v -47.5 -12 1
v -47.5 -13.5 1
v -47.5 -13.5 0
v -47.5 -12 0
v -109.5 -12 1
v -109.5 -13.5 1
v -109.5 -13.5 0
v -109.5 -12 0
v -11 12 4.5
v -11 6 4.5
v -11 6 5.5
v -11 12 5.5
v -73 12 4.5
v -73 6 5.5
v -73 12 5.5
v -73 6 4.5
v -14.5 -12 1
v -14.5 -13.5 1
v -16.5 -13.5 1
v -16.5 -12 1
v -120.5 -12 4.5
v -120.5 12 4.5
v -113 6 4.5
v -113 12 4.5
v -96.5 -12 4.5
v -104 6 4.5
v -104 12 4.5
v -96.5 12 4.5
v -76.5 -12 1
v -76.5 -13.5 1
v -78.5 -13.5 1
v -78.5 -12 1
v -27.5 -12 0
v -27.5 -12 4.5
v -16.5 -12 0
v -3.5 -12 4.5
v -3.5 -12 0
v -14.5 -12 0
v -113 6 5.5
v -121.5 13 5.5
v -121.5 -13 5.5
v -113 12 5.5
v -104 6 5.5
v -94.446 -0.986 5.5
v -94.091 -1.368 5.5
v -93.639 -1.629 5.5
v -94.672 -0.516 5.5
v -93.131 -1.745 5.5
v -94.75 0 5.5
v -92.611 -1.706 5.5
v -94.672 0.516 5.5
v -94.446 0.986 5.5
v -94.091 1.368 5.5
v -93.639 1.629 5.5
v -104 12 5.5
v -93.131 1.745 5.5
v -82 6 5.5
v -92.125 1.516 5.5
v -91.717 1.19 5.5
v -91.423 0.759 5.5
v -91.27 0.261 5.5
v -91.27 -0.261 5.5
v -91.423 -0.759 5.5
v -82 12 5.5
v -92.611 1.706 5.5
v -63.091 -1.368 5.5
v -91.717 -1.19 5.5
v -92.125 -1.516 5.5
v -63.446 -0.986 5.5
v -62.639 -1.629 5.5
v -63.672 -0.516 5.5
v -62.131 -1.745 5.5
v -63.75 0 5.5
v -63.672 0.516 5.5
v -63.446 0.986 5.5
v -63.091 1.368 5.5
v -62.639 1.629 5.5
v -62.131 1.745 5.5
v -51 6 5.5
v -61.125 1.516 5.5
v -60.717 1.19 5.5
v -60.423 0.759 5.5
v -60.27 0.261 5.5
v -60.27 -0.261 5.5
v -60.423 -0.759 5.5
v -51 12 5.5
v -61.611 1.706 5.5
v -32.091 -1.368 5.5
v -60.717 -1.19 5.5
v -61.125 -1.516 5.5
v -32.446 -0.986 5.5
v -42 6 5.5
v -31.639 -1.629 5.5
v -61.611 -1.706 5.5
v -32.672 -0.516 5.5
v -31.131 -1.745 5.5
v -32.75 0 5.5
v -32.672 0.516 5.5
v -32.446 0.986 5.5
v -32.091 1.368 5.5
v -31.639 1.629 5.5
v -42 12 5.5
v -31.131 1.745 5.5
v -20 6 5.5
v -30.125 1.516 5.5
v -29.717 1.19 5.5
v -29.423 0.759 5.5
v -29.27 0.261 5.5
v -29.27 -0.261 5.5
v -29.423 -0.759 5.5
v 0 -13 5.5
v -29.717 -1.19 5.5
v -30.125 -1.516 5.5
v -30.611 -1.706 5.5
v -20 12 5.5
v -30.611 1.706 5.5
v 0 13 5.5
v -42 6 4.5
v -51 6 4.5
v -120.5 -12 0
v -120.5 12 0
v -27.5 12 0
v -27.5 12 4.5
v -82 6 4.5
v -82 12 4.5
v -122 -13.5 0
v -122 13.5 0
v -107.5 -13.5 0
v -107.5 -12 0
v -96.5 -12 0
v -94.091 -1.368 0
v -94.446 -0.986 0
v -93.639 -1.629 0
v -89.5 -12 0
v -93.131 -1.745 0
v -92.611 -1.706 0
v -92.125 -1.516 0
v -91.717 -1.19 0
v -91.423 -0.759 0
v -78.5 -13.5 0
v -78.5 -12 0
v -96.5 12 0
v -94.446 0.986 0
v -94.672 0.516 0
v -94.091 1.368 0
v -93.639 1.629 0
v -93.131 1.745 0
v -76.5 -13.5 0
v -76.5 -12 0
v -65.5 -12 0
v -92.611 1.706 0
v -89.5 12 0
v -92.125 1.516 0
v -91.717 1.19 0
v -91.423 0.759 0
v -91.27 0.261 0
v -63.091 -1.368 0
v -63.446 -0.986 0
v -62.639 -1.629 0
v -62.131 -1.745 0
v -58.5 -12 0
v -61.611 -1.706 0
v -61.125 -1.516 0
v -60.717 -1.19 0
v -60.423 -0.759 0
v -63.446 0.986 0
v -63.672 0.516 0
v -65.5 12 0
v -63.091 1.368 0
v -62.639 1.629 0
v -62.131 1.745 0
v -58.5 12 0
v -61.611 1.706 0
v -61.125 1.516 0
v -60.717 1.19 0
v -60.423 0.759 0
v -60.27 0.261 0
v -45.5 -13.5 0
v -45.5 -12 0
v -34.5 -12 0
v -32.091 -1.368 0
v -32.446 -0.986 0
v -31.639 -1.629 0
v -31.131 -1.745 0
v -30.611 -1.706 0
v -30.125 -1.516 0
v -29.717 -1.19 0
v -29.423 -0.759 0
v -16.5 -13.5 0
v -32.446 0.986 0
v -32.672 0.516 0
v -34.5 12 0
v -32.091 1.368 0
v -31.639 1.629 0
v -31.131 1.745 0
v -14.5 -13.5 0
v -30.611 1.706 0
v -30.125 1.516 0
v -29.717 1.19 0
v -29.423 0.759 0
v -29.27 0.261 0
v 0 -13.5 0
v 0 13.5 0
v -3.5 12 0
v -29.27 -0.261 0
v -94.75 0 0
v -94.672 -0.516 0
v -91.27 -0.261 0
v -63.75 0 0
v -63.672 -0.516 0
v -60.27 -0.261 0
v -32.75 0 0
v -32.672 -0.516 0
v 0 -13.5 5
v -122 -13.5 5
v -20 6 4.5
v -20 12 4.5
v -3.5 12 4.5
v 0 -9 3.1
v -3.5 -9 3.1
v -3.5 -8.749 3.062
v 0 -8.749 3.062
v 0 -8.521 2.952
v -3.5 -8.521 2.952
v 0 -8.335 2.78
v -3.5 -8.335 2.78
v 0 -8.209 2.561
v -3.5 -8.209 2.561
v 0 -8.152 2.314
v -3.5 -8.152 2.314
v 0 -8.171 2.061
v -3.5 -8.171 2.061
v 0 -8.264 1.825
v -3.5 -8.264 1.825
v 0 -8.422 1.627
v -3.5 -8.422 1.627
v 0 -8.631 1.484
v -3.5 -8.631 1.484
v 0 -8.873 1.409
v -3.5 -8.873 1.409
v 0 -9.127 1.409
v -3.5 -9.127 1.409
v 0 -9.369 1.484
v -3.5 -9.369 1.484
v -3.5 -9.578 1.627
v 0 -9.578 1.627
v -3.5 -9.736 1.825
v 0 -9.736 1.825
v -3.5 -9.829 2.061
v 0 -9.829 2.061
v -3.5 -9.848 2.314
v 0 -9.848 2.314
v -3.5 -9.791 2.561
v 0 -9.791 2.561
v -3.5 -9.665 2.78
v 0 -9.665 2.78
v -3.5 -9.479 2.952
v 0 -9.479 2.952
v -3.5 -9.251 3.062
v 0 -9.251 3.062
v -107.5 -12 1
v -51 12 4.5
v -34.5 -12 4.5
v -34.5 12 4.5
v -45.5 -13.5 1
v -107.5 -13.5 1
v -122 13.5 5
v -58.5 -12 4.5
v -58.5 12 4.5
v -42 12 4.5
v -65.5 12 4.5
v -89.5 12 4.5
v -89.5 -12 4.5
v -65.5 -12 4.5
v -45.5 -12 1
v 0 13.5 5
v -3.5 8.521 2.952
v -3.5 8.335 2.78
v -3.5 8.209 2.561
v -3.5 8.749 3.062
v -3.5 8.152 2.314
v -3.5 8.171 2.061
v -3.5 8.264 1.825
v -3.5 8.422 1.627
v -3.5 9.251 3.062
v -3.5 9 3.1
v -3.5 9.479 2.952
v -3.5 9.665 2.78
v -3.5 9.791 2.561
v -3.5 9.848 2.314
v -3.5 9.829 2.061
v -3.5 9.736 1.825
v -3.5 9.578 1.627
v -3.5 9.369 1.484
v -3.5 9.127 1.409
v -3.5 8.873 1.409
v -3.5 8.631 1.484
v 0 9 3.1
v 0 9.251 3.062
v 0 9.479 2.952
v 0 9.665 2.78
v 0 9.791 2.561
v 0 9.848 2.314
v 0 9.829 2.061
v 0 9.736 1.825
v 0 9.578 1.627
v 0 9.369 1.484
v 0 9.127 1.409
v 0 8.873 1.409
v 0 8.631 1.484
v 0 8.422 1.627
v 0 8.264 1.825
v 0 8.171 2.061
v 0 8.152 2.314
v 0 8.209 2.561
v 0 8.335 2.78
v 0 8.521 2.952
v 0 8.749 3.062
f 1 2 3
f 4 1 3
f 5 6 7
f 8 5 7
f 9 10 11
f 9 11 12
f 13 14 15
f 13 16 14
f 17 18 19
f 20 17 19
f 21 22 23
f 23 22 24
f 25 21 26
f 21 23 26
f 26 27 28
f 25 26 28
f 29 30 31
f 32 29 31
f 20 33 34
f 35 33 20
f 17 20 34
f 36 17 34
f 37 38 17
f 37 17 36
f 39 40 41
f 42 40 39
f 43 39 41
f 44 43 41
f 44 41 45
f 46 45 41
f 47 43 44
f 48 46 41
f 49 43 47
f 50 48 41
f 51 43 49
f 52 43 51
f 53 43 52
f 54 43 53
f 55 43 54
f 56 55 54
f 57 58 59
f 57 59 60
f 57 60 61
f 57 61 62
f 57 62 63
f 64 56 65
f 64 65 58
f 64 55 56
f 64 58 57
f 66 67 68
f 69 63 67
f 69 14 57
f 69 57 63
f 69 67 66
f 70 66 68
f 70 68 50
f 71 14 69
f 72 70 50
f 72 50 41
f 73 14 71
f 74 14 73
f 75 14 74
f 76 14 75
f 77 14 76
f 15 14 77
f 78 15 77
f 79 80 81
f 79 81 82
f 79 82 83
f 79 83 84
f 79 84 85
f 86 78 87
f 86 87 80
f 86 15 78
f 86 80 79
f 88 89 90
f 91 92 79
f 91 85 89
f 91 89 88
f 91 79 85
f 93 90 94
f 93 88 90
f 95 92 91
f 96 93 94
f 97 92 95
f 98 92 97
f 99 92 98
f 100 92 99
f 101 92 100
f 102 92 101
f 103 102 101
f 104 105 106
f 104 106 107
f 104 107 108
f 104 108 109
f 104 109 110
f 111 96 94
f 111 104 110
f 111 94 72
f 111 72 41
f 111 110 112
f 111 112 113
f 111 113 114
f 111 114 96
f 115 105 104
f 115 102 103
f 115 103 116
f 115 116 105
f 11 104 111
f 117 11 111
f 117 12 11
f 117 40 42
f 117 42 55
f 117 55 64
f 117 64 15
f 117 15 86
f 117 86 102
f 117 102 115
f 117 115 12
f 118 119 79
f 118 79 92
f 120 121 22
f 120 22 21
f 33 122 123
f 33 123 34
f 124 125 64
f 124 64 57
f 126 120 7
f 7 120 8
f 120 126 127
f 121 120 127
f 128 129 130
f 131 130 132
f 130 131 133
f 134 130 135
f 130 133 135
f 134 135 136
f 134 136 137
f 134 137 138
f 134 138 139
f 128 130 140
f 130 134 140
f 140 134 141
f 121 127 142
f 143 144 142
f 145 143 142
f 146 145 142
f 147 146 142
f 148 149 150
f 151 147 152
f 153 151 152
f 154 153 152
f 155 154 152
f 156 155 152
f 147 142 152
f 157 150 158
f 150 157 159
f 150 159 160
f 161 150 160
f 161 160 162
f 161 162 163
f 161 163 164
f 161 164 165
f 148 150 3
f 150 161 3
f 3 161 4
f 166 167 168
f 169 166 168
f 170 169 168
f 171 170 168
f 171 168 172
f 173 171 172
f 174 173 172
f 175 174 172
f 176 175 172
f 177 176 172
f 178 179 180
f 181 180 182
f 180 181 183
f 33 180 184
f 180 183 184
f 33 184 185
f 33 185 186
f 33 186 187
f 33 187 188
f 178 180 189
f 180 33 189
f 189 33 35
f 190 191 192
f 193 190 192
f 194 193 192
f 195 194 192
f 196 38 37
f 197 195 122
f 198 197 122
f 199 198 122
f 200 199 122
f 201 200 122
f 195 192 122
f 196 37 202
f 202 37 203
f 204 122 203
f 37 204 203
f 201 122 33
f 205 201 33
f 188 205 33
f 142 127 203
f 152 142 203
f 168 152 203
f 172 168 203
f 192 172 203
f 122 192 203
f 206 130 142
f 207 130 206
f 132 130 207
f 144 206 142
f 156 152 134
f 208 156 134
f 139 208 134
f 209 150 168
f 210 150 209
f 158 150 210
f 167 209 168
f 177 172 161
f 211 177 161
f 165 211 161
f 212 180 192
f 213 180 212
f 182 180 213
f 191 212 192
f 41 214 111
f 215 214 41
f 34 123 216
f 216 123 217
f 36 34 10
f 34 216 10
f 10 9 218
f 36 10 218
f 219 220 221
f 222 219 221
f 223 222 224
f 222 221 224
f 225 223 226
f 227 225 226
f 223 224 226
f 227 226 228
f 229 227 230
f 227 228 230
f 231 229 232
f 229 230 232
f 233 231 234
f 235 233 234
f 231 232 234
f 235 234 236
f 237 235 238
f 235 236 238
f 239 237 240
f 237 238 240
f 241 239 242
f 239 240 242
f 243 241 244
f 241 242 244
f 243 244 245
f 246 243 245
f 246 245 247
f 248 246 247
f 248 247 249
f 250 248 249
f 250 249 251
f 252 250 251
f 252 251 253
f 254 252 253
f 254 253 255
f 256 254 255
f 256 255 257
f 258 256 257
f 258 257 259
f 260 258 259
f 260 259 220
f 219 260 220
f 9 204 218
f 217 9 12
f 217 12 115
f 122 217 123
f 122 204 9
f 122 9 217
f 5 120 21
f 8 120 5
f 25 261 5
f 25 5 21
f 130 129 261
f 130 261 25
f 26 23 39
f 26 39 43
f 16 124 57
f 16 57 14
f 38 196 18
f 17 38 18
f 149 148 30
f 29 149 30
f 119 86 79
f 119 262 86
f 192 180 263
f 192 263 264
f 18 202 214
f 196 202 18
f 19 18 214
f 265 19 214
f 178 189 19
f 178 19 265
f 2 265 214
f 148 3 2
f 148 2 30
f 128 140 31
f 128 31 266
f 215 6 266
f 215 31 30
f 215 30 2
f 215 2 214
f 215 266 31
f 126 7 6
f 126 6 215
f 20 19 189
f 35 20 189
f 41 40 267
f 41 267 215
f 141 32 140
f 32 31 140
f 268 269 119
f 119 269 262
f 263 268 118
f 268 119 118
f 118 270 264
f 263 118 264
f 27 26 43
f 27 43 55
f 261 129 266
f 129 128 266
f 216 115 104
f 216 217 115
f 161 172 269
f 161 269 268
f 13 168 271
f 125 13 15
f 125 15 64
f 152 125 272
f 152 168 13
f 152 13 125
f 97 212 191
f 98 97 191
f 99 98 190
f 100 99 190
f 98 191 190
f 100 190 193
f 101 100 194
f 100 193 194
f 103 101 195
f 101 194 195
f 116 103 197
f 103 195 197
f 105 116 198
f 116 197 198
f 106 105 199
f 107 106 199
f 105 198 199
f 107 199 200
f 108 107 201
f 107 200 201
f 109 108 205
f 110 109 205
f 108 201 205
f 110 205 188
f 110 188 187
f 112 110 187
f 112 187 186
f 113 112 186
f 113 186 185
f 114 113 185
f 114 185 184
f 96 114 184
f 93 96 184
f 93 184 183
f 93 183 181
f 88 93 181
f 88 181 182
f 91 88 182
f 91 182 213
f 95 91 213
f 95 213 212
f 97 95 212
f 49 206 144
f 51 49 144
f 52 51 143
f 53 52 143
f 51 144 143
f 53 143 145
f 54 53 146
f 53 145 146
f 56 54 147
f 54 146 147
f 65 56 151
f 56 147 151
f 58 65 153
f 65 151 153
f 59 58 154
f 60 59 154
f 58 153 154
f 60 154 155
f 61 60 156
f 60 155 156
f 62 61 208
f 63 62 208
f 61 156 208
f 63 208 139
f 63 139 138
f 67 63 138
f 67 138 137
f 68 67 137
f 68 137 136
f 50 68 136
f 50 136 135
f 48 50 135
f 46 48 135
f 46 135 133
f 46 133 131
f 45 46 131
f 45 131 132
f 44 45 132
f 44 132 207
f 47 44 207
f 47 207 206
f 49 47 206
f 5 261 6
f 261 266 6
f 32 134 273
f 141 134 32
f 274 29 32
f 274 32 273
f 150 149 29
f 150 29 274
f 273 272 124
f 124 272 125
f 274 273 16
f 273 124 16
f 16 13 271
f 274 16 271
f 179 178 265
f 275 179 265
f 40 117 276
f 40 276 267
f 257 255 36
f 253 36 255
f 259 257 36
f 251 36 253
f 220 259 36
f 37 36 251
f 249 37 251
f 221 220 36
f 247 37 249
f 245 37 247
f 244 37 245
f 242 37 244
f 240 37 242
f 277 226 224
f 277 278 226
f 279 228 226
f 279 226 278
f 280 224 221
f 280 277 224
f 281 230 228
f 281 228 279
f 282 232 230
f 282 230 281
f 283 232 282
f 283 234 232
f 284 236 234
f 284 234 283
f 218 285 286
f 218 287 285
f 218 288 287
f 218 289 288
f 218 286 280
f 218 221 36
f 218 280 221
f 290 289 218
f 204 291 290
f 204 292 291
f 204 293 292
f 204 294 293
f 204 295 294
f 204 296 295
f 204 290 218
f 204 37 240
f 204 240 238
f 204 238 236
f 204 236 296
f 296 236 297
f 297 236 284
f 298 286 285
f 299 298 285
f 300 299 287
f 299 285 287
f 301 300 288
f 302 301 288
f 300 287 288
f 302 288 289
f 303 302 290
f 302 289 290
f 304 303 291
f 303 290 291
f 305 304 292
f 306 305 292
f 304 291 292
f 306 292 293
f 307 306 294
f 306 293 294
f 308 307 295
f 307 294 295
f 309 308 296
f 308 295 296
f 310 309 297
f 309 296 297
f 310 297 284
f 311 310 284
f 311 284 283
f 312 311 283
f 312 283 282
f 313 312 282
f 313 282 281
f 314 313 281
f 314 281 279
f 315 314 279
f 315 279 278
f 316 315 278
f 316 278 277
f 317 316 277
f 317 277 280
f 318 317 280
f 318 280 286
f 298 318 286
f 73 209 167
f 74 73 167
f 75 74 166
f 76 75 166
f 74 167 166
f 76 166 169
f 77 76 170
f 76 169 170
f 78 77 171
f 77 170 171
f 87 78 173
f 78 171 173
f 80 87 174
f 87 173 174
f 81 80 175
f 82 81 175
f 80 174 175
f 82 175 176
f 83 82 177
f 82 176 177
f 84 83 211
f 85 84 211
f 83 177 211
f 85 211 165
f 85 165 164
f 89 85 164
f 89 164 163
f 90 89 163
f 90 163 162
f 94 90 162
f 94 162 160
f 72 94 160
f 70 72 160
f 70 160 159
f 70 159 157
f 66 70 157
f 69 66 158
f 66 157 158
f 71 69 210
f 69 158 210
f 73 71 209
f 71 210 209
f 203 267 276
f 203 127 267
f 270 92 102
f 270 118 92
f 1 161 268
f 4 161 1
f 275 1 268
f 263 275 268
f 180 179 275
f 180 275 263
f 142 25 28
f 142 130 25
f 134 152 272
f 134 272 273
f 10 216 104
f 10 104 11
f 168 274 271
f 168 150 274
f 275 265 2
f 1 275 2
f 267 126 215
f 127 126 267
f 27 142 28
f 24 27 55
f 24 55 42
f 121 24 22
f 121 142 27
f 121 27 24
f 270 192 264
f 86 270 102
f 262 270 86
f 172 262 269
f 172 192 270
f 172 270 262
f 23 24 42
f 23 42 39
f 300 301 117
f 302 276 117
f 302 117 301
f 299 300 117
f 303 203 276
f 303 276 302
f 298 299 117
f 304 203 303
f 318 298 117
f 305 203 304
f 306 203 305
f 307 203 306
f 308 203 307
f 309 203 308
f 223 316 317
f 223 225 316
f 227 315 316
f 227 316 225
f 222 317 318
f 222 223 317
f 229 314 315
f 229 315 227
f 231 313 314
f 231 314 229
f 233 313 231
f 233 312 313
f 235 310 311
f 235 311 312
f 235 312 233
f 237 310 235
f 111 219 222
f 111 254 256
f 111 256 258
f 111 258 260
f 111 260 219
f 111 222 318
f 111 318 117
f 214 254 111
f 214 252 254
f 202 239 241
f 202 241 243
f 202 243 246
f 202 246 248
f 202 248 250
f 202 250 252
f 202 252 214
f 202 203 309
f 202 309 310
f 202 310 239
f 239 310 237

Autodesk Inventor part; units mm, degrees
ref_plane "YZ Plane" through (0, 0, 0) normal (1, 0, 0) x (0, 1, 0)
ref_plane "XZ Plane" through (0, 0, 0) normal (0, 1, 0) x (-1, 0, 0)
ref_plane "XY Plane" through (0, 0, 0) normal (0, 0, 1) x (1, 0, 0)
sketch "Sketch1" plane through (0, 0, 0) normal (0, 0, 1) x (1, 0, 0)
  line L0 (-122, 13.5) -> (122, 13.5)
  line L1 (122, 13.5) -> (122, -13.5)
  line L2 (122, -13.5) -> (-122, -13.5)
  line L3 (-122, -13.5) -> (-122, 13.5)
  line L4 (-122, 13.5) -> (122, -13.5) construction
  line L5 (122, 13.5) -> (-122, -13.5) construction
  line L6 (-120.5, -12) -> (-96.5, -12)
  line L7 (-96.5, -12) -> (-96.5, 12)
  line L8 (-96.5, 12) -> (-120.5, 12)
  line L9 (-120.5, 12) -> (-120.5, -12)
  line L10 (-120.5, -12) -> (-96.5, 12) construction
  line L11 (-96.5, -12) -> (-120.5, 12) construction
  line L12 (-122, 0) -> (-108.5, 0) construction
  line L13 (-89.5, -12) -> (-65.5, -12)
  line L14 (-65.5, -12) -> (-65.5, 12)
  line L15 (-65.5, 12) -> (-89.5, 12)
  line L16 (-89.5, 12) -> (-89.5, -12)
  line L17 (-89.5, -12) -> (-65.5, 12) construction
  line L18 (-65.5, -12) -> (-89.5, 12) construction
  line L19 (-58.5, -12) -> (-34.5, -12)
  line L20 (-34.5, -12) -> (-34.5, 12)
  line L21 (-34.5, 12) -> (-58.5, 12)
  line L22 (-58.5, 12) -> (-58.5, -12)
  line L23 (-58.5, -12) -> (-34.5, 12) construction
  line L24 (-34.5, -12) -> (-58.5, 12) construction
  line L25 (-27.5, -12) -> (-3.5, -12)
  line L26 (-3.5, -12) -> (-3.5, 12)
  line L27 (-3.5, 12) -> (-27.5, 12)
  line L28 (-27.5, 12) -> (-27.5, -12)
  line L29 (-27.5, -12) -> (-3.5, 12) construction
  line L30 (-3.5, -12) -> (-27.5, 12) construction
  line L31 (3.5, -12) -> (27.5, -12)
  line L32 (27.5, -12) -> (27.5, 12)
  line L33 (27.5, 12) -> (3.5, 12)
  line L34 (3.5, 12) -> (3.5, -12)
  line L35 (3.5, -12) -> (27.5, 12) construction
  line L36 (27.5, -12) -> (3.5, 12) construction
  line L37 (34.5, -12) -> (58.5, -12)
  line L38 (58.5, -12) -> (58.5, 12)
  line L39 (58.5, 12) -> (34.5, 12)
  line L40 (34.5, 12) -> (34.5, -12)
  line L41 (34.5, -12) -> (58.5, 12) construction
  line L42 (58.5, -12) -> (34.5, 12) construction
  line L43 (65.5, -12) -> (89.5, -12)
  line L44 (89.5, -12) -> (89.5, 12)
  line L45 (89.5, 12) -> (65.5, 12)
  line L46 (65.5, 12) -> (65.5, -12)
  line L47 (65.5, -12) -> (89.5, 12) construction
  line L48 (89.5, -12) -> (65.5, 12) construction
  line L49 (96.5, -12) -> (120.5, -12)
  line L50 (120.5, -12) -> (120.5, 12)
  line L51 (120.5, 12) -> (96.5, 12)
  line L52 (96.5, 12) -> (96.5, -12)
  line L53 (96.5, -12) -> (120.5, 12) construction
  line L54 (120.5, -12) -> (96.5, 12) construction
  point P0 (0, 0)
  point P1 (-77.5, 0)
  point P2 (-46.5, 0)
  point P3 (-15.5, 0)
  point P4 (15.5, 0)
  point P5 (46.5, 0)
  point P6 (77.5, 0)
  point P7 (108.5, 0)
  dimension "d2" = 24
  dimension "d3" = 24
  dimension "d6" = 31
  dimension "d11" = 7
  dimension "d12" = 1.5
  dimension "d13" = 1.5
  dimension "d14" = 1.5
extrude "Extrusion1" add sketch "Sketch1" along normal blind 4.5
sketch "Sketch2" plane through (0, 0, 4.5) normal (0, 0, 1) x (1, 0, 0)
  line L0 (-120.5, 12) -> (-96.5, 12) construction
  line L1 (-113, 6) -> (-104, 6)
  line L2 (-104, 6) -> (-104, 12)
  line L3 (-104, 12) -> (-113, 12)
  line L4 (-113, 12) -> (-113, 6)
  line L5 (-113, 6) -> (-104, 12) construction
  line L6 (-104, 6) -> (-113, 12) construction
  line L7 (-108.5, 12) -> (-108.5, 9) construction
  line L8 (122, 13.5) -> (-122, 13.5) projected
  line L9 (-122, -13.5) -> (122, -13.5) projected
  line L10 (-122, 13.5) -> (122, 13.5)
  line L11 (122, 13.5) -> (122, -13.5)
  line L12 (122, -13.5) -> (-122, -13.5)
  line L13 (-122, -13.5) -> (-122, 13.5)
  line L14 (-82, 6) -> (-73, 6)
  line L15 (-73, 6) -> (-73, 12)
  line L16 (-73, 12) -> (-82, 12)
  line L17 (-82, 12) -> (-82, 6)
  line L18 (-82, 6) -> (-73, 12) construction
  line L19 (-73, 6) -> (-82, 12) construction
  line L20 (-77.5, 12) -> (-77.5, 9) construction
  line L21 (-51, 6) -> (-42, 6)
  line L22 (-42, 6) -> (-42, 12)
  line L23 (-42, 12) -> (-51, 12)
  line L24 (-51, 12) -> (-51, 6)
  line L25 (-51, 6) -> (-42, 12) construction
  line L26 (-42, 6) -> (-51, 12) construction
  line L27 (-46.5, 12) -> (-46.5, 9) construction
  line L28 (-20, 6) -> (-11, 6)
  line L29 (-11, 6) -> (-11, 12)
  line L30 (-11, 12) -> (-20, 12)
  line L31 (-20, 12) -> (-20, 6)
  line L32 (-20, 6) -> (-11, 12) construction
  line L33 (-11, 6) -> (-20, 12) construction
  line L34 (-15.5, 12) -> (-15.5, 9) construction
  line L35 (11, 6) -> (20, 6)
  line L36 (20, 6) -> (20, 12)
  line L37 (20, 12) -> (11, 12)
  line L38 (11, 12) -> (11, 6)
  line L39 (11, 6) -> (20, 12) construction
  line L40 (20, 6) -> (11, 12) construction
  line L41 (15.5, 12) -> (15.5, 9) construction
  line L42 (42, 6) -> (51, 6)
  line L43 (51, 6) -> (51, 12)
  line L44 (51, 12) -> (42, 12)
  line L45 (42, 12) -> (42, 6)
  line L46 (42, 6) -> (51, 12) construction
  line L47 (51, 6) -> (42, 12) construction
  line L48 (46.5, 12) -> (46.5, 9) construction
  line L49 (73, 6) -> (82, 6)
  line L50 (82, 6) -> (82, 12)
  line L51 (82, 12) -> (73, 12)
  line L52 (73, 12) -> (73, 6)
  line L53 (73, 6) -> (82, 12) construction
  line L54 (82, 6) -> (73, 12) construction
  line L55 (77.5, 12) -> (77.5, 9) construction
  line L56 (104, 6) -> (113, 6)
  line L57 (113, 6) -> (113, 12)
  line L58 (113, 12) -> (104, 12)
  line L59 (104, 12) -> (104, 6)
  line L60 (104, 6) -> (113, 12) construction
  line L61 (113, 6) -> (104, 12) construction
  line L62 (108.5, 12) -> (108.5, 9) construction
  line L63 (-89.5, 12) -> (-65.5, 12) construction
  line L64 (-89.5, 12) -> (-65.5, 12) construction
  point P0 (0, 0)
  dimension "d17" = 6
  dimension "d18" = 9
  dimension "d21" = 31
extrude "Extrusion2" add sketch "Sketch2" along normal blind 1
sketch "Sketch3" plane through (0, 0, 0) normal (0, 0, -1) x (-1, 0, 0)
  line L0 (-96.5, -12) -> (-96.5, 12) projected
  line L1 (-96.5, 0) -> (-89.5, 0) construction
  line L2 (-89.5, 12) -> (-89.5, -12) projected
  circle A0 centre (-93, 0) radius 1.75
  line L3 (-65.5, -12) -> (-65.5, 12) projected
  line L4 (-65.5, 0) -> (-58.5, 0) construction
  line L5 (-58.5, 12) -> (-58.5, -12) projected
  circle A1 centre (-62, 0) radius 1.75
  circle A2 centre (-31, 0) radius 1.75
  circle A3 centre (0, 0) radius 1.75
  circle A4 centre (31, 0) radius 1.75
  circle A5 centre (62, 0) radius 1.75
  circle A6 centre (93, 0) radius 1.75
  point P0 (0, 0)
  dimension "d28" = 3.5
  dimension "d31" = 31
extrude "Extrusion3" cut sketch "Sketch3" against normal through all contours A0 | A1 | A2 | A4 | A5 | A6
sketch "Sketch4" plane through (-122, -13.5, 0) normal (0, -1, 0) x (1, 0, 0)
  line L0 (242.5, 0) -> (218.5, 0) projected
  line L1 (211.5, 0) -> (187.5, 0) projected
  line L2 (231.5, 1) -> (229.5, 1)
  line L3 (229.5, 1) -> (229.5, -1)
  line L4 (229.5, -1) -> (231.5, -1)
  line L5 (231.5, -1) -> (231.5, 1)
  line L6 (231.5, 1) -> (229.5, -1) construction
  line L7 (229.5, 1) -> (231.5, -1) construction
  line L8 (200.5, 1) -> (198.5, 1)
  line L9 (198.5, 1) -> (198.5, -1)
  line L10 (198.5, -1) -> (200.5, -1)
  line L11 (200.5, -1) -> (200.5, 1)
  line L12 (200.5, 1) -> (198.5, -1) construction
  line L13 (198.5, 1) -> (200.5, -1) construction
  line L14 (169.5, 1) -> (167.5, 1)
  line L15 (167.5, 1) -> (167.5, -1)
  line L16 (167.5, -1) -> (169.5, -1)
  line L17 (169.5, -1) -> (169.5, 1)
  line L18 (169.5, 1) -> (167.5, -1) construction
  line L19 (167.5, 1) -> (169.5, -1) construction
  line L20 (138.5, 1) -> (136.5, 1)
  line L21 (136.5, 1) -> (136.5, -1)
  line L22 (136.5, -1) -> (138.5, -1)
  line L23 (138.5, -1) -> (138.5, 1)
  line L24 (138.5, 1) -> (136.5, -1) construction
  line L25 (136.5, 1) -> (138.5, -1) construction
  line L26 (107.5, 1) -> (105.5, 1)
  line L27 (105.5, 1) -> (105.5, -1)
  line L28 (105.5, -1) -> (107.5, -1)
  line L29 (107.5, -1) -> (107.5, 1)
  line L30 (107.5, 1) -> (105.5, -1) construction
  line L31 (105.5, 1) -> (107.5, -1) construction
  line L32 (76.5, 1) -> (74.5, 1)
  line L33 (74.5, 1) -> (74.5, -1)
  line L34 (74.5, -1) -> (76.5, -1)
  line L35 (76.5, -1) -> (76.5, 1)
  line L36 (76.5, 1) -> (74.5, -1) construction
  line L37 (74.5, 1) -> (76.5, -1) construction
  line L38 (45.5, 1) -> (43.5, 1)
  line L39 (43.5, 1) -> (43.5, -1)
  line L40 (43.5, -1) -> (45.5, -1)
  line L41 (45.5, -1) -> (45.5, 1)
  line L42 (45.5, 1) -> (43.5, -1) construction
  line L43 (43.5, 1) -> (45.5, -1) construction
  line L44 (14.5, 1) -> (12.5, 1)
  line L45 (12.5, 1) -> (12.5, -1)
  line L46 (12.5, -1) -> (14.5, -1)
  line L47 (14.5, -1) -> (14.5, 1)
  line L48 (14.5, 1) -> (12.5, -1) construction
  line L49 (12.5, 1) -> (14.5, -1) construction
  point P0 (122, 0)
  point P1 (230.5, 0)
  point P2 (199.5, 0)
  point P3 (168.5, 0)
  point P4 (137.5, 0)
  point P5 (106.5, 0)
  point P6 (75.5, 0)
  point P7 (44.5, 0)
  point P8 (13.5, 0)
  dimension "d40" = 31
  dimension "d45" = 1
  dimension "d46" = 2
extrude "Extrusion4" cut sketch "Sketch4" against normal blind 4.5
sketch "Sketch5" plane through (-3.5, -12, 0) normal (-1, 0, 0) x (0, 0, 1)
  line L0 (0, 0) -> (4.5, 0) projected
  line L1 (2.25, 0) -> (2.25, 24) construction
  line L2 (0, 24) -> (4.5, 24) projected
  circle A0 centre (2.25, 3) radius 0.85
  circle A1 centre (2.25, 21) radius 0.85
  point P0 (0, 12)
  dimension "d49" = 1.7
  dimension "d50" = 3
  dimension "d51" = 3
extrude "Extrusion5" cut sketch "Sketch5" against normal up to surface (7 mm away)
chamfer "Chamfer1" distance 0.5 angle 45 4 edges at (0, -13.5, 5.5) (122, 0, 5.5) (0, 13.5, 5.5) (-122, 0, 5.5)
sketch "Sketch7" plane through (0, 0, 0) normal (0, 0, -1) x (-1, 0, 0)
  line L0 (-167.9022, 73.2731) -> (0, 73.2731)
  line L1 (0, 73.2731) -> (0, -62.2269)
  line L2 (0, -62.2269) -> (-167.9022, -62.2269)
  line L3 (-167.9022, -62.2269) -> (-167.9022, 73.2731)
  line L4 (0, 73.2731) -> (150.1362, 73.2731)
  line L5 (150.1362, 73.2731) -> (150.1362, -62.2269)
  line L6 (150.1362, -62.2269) -> (0, -62.2269)
  line L7 (0, -62.2269) -> (0, 73.2731)
  point P0 (0, 0)
extrude "Extrusion7" cut sketch "Sketch7" against normal through all contours L0 L1 L2 L3
properties part number "SensorHolder"
